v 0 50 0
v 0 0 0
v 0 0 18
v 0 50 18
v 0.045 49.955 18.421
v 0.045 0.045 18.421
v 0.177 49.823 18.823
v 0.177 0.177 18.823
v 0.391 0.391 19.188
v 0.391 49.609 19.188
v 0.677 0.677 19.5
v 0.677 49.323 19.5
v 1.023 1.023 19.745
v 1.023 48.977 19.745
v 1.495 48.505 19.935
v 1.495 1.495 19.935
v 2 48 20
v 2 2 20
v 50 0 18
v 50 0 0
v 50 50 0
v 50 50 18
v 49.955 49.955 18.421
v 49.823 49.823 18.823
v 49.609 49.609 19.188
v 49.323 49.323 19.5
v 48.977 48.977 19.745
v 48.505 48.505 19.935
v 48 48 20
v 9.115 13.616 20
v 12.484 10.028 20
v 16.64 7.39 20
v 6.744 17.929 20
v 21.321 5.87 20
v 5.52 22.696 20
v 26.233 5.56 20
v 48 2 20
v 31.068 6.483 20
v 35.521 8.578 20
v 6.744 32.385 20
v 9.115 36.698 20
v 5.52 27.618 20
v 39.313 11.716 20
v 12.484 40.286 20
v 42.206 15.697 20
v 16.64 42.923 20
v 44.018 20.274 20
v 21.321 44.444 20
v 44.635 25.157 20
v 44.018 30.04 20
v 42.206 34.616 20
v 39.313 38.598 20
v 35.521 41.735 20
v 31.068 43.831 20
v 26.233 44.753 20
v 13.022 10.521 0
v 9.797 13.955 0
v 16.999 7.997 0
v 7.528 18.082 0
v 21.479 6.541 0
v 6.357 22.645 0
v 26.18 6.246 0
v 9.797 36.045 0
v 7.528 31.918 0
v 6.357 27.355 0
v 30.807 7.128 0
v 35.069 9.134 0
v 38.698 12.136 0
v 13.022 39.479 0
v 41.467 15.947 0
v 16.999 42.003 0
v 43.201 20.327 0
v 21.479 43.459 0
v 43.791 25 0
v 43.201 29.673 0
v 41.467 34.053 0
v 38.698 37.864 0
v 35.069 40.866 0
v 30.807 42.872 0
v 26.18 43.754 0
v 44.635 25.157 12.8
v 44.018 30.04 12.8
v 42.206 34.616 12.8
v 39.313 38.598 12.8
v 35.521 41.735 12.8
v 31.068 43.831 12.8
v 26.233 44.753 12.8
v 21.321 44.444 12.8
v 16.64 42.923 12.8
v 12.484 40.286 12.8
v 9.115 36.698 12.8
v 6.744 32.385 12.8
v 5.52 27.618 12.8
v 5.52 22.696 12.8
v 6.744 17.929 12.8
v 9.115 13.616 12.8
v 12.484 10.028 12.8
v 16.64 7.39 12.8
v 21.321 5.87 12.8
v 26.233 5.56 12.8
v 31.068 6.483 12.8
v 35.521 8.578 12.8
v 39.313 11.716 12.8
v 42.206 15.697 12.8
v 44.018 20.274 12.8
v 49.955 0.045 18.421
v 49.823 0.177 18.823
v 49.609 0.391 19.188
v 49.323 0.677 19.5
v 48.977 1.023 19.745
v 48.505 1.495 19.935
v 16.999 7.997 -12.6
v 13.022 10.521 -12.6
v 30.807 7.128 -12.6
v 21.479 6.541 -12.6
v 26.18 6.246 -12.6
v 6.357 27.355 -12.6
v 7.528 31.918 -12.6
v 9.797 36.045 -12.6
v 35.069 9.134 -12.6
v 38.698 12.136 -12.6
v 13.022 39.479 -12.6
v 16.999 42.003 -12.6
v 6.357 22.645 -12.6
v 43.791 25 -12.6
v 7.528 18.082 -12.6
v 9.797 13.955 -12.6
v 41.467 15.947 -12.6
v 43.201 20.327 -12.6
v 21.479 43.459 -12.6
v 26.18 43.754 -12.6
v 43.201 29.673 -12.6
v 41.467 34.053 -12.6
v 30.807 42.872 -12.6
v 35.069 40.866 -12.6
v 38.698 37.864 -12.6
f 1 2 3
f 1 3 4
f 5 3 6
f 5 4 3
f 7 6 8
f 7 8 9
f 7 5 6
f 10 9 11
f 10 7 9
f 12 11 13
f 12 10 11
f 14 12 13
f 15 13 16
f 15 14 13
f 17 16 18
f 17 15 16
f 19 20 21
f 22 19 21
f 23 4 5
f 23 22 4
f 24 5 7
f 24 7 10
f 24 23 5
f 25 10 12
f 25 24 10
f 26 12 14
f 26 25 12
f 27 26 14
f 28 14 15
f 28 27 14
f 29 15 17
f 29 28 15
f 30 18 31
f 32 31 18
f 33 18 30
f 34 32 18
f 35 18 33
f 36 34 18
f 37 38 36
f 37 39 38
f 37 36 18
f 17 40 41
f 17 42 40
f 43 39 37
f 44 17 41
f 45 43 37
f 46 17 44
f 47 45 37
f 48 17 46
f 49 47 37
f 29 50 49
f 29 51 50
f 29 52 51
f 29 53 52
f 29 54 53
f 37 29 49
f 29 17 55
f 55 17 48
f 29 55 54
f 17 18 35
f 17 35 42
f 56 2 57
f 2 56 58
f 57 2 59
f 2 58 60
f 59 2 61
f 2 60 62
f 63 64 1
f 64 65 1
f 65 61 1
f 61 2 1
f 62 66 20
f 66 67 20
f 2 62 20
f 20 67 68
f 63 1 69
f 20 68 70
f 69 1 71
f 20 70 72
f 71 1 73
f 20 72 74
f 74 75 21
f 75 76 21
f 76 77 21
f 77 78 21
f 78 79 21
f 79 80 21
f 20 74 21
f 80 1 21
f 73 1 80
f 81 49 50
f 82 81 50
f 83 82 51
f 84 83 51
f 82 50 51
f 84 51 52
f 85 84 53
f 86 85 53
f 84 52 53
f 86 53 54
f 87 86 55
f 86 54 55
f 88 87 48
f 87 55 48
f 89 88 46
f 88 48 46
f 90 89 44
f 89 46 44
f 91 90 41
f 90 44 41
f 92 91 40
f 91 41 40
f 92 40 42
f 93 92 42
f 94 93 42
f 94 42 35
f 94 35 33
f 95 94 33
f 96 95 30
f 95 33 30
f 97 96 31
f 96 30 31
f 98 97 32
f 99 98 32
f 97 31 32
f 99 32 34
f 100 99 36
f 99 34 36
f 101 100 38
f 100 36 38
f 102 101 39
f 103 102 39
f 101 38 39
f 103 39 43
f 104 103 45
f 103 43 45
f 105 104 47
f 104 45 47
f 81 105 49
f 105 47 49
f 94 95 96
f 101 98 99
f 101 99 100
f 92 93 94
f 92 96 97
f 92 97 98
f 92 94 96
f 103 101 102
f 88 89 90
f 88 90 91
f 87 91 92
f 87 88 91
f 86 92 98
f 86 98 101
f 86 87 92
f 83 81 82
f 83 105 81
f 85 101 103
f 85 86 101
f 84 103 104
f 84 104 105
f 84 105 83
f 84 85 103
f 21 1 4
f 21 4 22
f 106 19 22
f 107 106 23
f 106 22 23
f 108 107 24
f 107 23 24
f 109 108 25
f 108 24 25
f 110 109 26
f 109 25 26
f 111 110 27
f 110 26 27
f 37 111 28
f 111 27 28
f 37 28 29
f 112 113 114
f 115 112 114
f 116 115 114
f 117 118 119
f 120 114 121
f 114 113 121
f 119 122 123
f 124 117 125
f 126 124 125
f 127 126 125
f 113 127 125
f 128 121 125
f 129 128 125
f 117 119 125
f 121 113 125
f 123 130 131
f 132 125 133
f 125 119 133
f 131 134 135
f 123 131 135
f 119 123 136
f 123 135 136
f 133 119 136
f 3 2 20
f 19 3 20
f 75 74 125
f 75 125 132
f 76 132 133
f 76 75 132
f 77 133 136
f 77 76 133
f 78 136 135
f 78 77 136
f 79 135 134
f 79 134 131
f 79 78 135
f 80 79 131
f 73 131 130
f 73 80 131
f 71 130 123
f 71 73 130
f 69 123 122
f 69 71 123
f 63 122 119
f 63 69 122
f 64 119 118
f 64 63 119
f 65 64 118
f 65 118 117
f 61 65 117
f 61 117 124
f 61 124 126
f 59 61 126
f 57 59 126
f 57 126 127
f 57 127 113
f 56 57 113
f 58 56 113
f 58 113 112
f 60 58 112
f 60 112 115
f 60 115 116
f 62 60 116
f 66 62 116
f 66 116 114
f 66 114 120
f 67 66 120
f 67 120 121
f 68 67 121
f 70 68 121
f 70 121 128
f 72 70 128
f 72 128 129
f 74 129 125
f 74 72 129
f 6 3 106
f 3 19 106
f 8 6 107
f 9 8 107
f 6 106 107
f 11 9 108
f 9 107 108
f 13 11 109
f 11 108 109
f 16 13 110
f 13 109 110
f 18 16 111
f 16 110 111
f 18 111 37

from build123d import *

# Parameters (mm, degrees)
F0_W     = 50
F0_H     = 50
F1_DEPTH = 20
F2_R     = 2
F3_R     = 18.791434
F4_DEPTH = 32.6
F6_R     = 19.635013
F7_DEPTH = 7.2


with BuildPart() as f1:
    # F0 (on Top) → F1 (new body)
    with BuildSketch(Plane.XY):
        with Locations((25, 25)):
            Rectangle(F0_W, F0_H)
    extrude(amount=F1_DEPTH)

    # F2
    f2_edges = [f1.edges().sort_by_distance(p)[0] for p in [
        (50, 25, 20),
        (25, 50, 20),
        (0, 25, 20),
        (25, 0, 20),
    ]]
    fillet(f2_edges, radius=F2_R)

    # F3 (on face) → F4 (join)
    with BuildSketch(Plane.XY.offset(20)):
        with Locations((25, 25)):
            Circle(F3_R)
    extrude(amount=-F4_DEPTH)

    # F6 (on face) → F7 (cut)
    with BuildSketch(Plane.XY.offset(20)):
        with Locations((25, 25.156734)):
            Circle(F6_R)
    extrude(amount=-F7_DEPTH, mode=Mode.SUBTRACT)


solid = f1.part
